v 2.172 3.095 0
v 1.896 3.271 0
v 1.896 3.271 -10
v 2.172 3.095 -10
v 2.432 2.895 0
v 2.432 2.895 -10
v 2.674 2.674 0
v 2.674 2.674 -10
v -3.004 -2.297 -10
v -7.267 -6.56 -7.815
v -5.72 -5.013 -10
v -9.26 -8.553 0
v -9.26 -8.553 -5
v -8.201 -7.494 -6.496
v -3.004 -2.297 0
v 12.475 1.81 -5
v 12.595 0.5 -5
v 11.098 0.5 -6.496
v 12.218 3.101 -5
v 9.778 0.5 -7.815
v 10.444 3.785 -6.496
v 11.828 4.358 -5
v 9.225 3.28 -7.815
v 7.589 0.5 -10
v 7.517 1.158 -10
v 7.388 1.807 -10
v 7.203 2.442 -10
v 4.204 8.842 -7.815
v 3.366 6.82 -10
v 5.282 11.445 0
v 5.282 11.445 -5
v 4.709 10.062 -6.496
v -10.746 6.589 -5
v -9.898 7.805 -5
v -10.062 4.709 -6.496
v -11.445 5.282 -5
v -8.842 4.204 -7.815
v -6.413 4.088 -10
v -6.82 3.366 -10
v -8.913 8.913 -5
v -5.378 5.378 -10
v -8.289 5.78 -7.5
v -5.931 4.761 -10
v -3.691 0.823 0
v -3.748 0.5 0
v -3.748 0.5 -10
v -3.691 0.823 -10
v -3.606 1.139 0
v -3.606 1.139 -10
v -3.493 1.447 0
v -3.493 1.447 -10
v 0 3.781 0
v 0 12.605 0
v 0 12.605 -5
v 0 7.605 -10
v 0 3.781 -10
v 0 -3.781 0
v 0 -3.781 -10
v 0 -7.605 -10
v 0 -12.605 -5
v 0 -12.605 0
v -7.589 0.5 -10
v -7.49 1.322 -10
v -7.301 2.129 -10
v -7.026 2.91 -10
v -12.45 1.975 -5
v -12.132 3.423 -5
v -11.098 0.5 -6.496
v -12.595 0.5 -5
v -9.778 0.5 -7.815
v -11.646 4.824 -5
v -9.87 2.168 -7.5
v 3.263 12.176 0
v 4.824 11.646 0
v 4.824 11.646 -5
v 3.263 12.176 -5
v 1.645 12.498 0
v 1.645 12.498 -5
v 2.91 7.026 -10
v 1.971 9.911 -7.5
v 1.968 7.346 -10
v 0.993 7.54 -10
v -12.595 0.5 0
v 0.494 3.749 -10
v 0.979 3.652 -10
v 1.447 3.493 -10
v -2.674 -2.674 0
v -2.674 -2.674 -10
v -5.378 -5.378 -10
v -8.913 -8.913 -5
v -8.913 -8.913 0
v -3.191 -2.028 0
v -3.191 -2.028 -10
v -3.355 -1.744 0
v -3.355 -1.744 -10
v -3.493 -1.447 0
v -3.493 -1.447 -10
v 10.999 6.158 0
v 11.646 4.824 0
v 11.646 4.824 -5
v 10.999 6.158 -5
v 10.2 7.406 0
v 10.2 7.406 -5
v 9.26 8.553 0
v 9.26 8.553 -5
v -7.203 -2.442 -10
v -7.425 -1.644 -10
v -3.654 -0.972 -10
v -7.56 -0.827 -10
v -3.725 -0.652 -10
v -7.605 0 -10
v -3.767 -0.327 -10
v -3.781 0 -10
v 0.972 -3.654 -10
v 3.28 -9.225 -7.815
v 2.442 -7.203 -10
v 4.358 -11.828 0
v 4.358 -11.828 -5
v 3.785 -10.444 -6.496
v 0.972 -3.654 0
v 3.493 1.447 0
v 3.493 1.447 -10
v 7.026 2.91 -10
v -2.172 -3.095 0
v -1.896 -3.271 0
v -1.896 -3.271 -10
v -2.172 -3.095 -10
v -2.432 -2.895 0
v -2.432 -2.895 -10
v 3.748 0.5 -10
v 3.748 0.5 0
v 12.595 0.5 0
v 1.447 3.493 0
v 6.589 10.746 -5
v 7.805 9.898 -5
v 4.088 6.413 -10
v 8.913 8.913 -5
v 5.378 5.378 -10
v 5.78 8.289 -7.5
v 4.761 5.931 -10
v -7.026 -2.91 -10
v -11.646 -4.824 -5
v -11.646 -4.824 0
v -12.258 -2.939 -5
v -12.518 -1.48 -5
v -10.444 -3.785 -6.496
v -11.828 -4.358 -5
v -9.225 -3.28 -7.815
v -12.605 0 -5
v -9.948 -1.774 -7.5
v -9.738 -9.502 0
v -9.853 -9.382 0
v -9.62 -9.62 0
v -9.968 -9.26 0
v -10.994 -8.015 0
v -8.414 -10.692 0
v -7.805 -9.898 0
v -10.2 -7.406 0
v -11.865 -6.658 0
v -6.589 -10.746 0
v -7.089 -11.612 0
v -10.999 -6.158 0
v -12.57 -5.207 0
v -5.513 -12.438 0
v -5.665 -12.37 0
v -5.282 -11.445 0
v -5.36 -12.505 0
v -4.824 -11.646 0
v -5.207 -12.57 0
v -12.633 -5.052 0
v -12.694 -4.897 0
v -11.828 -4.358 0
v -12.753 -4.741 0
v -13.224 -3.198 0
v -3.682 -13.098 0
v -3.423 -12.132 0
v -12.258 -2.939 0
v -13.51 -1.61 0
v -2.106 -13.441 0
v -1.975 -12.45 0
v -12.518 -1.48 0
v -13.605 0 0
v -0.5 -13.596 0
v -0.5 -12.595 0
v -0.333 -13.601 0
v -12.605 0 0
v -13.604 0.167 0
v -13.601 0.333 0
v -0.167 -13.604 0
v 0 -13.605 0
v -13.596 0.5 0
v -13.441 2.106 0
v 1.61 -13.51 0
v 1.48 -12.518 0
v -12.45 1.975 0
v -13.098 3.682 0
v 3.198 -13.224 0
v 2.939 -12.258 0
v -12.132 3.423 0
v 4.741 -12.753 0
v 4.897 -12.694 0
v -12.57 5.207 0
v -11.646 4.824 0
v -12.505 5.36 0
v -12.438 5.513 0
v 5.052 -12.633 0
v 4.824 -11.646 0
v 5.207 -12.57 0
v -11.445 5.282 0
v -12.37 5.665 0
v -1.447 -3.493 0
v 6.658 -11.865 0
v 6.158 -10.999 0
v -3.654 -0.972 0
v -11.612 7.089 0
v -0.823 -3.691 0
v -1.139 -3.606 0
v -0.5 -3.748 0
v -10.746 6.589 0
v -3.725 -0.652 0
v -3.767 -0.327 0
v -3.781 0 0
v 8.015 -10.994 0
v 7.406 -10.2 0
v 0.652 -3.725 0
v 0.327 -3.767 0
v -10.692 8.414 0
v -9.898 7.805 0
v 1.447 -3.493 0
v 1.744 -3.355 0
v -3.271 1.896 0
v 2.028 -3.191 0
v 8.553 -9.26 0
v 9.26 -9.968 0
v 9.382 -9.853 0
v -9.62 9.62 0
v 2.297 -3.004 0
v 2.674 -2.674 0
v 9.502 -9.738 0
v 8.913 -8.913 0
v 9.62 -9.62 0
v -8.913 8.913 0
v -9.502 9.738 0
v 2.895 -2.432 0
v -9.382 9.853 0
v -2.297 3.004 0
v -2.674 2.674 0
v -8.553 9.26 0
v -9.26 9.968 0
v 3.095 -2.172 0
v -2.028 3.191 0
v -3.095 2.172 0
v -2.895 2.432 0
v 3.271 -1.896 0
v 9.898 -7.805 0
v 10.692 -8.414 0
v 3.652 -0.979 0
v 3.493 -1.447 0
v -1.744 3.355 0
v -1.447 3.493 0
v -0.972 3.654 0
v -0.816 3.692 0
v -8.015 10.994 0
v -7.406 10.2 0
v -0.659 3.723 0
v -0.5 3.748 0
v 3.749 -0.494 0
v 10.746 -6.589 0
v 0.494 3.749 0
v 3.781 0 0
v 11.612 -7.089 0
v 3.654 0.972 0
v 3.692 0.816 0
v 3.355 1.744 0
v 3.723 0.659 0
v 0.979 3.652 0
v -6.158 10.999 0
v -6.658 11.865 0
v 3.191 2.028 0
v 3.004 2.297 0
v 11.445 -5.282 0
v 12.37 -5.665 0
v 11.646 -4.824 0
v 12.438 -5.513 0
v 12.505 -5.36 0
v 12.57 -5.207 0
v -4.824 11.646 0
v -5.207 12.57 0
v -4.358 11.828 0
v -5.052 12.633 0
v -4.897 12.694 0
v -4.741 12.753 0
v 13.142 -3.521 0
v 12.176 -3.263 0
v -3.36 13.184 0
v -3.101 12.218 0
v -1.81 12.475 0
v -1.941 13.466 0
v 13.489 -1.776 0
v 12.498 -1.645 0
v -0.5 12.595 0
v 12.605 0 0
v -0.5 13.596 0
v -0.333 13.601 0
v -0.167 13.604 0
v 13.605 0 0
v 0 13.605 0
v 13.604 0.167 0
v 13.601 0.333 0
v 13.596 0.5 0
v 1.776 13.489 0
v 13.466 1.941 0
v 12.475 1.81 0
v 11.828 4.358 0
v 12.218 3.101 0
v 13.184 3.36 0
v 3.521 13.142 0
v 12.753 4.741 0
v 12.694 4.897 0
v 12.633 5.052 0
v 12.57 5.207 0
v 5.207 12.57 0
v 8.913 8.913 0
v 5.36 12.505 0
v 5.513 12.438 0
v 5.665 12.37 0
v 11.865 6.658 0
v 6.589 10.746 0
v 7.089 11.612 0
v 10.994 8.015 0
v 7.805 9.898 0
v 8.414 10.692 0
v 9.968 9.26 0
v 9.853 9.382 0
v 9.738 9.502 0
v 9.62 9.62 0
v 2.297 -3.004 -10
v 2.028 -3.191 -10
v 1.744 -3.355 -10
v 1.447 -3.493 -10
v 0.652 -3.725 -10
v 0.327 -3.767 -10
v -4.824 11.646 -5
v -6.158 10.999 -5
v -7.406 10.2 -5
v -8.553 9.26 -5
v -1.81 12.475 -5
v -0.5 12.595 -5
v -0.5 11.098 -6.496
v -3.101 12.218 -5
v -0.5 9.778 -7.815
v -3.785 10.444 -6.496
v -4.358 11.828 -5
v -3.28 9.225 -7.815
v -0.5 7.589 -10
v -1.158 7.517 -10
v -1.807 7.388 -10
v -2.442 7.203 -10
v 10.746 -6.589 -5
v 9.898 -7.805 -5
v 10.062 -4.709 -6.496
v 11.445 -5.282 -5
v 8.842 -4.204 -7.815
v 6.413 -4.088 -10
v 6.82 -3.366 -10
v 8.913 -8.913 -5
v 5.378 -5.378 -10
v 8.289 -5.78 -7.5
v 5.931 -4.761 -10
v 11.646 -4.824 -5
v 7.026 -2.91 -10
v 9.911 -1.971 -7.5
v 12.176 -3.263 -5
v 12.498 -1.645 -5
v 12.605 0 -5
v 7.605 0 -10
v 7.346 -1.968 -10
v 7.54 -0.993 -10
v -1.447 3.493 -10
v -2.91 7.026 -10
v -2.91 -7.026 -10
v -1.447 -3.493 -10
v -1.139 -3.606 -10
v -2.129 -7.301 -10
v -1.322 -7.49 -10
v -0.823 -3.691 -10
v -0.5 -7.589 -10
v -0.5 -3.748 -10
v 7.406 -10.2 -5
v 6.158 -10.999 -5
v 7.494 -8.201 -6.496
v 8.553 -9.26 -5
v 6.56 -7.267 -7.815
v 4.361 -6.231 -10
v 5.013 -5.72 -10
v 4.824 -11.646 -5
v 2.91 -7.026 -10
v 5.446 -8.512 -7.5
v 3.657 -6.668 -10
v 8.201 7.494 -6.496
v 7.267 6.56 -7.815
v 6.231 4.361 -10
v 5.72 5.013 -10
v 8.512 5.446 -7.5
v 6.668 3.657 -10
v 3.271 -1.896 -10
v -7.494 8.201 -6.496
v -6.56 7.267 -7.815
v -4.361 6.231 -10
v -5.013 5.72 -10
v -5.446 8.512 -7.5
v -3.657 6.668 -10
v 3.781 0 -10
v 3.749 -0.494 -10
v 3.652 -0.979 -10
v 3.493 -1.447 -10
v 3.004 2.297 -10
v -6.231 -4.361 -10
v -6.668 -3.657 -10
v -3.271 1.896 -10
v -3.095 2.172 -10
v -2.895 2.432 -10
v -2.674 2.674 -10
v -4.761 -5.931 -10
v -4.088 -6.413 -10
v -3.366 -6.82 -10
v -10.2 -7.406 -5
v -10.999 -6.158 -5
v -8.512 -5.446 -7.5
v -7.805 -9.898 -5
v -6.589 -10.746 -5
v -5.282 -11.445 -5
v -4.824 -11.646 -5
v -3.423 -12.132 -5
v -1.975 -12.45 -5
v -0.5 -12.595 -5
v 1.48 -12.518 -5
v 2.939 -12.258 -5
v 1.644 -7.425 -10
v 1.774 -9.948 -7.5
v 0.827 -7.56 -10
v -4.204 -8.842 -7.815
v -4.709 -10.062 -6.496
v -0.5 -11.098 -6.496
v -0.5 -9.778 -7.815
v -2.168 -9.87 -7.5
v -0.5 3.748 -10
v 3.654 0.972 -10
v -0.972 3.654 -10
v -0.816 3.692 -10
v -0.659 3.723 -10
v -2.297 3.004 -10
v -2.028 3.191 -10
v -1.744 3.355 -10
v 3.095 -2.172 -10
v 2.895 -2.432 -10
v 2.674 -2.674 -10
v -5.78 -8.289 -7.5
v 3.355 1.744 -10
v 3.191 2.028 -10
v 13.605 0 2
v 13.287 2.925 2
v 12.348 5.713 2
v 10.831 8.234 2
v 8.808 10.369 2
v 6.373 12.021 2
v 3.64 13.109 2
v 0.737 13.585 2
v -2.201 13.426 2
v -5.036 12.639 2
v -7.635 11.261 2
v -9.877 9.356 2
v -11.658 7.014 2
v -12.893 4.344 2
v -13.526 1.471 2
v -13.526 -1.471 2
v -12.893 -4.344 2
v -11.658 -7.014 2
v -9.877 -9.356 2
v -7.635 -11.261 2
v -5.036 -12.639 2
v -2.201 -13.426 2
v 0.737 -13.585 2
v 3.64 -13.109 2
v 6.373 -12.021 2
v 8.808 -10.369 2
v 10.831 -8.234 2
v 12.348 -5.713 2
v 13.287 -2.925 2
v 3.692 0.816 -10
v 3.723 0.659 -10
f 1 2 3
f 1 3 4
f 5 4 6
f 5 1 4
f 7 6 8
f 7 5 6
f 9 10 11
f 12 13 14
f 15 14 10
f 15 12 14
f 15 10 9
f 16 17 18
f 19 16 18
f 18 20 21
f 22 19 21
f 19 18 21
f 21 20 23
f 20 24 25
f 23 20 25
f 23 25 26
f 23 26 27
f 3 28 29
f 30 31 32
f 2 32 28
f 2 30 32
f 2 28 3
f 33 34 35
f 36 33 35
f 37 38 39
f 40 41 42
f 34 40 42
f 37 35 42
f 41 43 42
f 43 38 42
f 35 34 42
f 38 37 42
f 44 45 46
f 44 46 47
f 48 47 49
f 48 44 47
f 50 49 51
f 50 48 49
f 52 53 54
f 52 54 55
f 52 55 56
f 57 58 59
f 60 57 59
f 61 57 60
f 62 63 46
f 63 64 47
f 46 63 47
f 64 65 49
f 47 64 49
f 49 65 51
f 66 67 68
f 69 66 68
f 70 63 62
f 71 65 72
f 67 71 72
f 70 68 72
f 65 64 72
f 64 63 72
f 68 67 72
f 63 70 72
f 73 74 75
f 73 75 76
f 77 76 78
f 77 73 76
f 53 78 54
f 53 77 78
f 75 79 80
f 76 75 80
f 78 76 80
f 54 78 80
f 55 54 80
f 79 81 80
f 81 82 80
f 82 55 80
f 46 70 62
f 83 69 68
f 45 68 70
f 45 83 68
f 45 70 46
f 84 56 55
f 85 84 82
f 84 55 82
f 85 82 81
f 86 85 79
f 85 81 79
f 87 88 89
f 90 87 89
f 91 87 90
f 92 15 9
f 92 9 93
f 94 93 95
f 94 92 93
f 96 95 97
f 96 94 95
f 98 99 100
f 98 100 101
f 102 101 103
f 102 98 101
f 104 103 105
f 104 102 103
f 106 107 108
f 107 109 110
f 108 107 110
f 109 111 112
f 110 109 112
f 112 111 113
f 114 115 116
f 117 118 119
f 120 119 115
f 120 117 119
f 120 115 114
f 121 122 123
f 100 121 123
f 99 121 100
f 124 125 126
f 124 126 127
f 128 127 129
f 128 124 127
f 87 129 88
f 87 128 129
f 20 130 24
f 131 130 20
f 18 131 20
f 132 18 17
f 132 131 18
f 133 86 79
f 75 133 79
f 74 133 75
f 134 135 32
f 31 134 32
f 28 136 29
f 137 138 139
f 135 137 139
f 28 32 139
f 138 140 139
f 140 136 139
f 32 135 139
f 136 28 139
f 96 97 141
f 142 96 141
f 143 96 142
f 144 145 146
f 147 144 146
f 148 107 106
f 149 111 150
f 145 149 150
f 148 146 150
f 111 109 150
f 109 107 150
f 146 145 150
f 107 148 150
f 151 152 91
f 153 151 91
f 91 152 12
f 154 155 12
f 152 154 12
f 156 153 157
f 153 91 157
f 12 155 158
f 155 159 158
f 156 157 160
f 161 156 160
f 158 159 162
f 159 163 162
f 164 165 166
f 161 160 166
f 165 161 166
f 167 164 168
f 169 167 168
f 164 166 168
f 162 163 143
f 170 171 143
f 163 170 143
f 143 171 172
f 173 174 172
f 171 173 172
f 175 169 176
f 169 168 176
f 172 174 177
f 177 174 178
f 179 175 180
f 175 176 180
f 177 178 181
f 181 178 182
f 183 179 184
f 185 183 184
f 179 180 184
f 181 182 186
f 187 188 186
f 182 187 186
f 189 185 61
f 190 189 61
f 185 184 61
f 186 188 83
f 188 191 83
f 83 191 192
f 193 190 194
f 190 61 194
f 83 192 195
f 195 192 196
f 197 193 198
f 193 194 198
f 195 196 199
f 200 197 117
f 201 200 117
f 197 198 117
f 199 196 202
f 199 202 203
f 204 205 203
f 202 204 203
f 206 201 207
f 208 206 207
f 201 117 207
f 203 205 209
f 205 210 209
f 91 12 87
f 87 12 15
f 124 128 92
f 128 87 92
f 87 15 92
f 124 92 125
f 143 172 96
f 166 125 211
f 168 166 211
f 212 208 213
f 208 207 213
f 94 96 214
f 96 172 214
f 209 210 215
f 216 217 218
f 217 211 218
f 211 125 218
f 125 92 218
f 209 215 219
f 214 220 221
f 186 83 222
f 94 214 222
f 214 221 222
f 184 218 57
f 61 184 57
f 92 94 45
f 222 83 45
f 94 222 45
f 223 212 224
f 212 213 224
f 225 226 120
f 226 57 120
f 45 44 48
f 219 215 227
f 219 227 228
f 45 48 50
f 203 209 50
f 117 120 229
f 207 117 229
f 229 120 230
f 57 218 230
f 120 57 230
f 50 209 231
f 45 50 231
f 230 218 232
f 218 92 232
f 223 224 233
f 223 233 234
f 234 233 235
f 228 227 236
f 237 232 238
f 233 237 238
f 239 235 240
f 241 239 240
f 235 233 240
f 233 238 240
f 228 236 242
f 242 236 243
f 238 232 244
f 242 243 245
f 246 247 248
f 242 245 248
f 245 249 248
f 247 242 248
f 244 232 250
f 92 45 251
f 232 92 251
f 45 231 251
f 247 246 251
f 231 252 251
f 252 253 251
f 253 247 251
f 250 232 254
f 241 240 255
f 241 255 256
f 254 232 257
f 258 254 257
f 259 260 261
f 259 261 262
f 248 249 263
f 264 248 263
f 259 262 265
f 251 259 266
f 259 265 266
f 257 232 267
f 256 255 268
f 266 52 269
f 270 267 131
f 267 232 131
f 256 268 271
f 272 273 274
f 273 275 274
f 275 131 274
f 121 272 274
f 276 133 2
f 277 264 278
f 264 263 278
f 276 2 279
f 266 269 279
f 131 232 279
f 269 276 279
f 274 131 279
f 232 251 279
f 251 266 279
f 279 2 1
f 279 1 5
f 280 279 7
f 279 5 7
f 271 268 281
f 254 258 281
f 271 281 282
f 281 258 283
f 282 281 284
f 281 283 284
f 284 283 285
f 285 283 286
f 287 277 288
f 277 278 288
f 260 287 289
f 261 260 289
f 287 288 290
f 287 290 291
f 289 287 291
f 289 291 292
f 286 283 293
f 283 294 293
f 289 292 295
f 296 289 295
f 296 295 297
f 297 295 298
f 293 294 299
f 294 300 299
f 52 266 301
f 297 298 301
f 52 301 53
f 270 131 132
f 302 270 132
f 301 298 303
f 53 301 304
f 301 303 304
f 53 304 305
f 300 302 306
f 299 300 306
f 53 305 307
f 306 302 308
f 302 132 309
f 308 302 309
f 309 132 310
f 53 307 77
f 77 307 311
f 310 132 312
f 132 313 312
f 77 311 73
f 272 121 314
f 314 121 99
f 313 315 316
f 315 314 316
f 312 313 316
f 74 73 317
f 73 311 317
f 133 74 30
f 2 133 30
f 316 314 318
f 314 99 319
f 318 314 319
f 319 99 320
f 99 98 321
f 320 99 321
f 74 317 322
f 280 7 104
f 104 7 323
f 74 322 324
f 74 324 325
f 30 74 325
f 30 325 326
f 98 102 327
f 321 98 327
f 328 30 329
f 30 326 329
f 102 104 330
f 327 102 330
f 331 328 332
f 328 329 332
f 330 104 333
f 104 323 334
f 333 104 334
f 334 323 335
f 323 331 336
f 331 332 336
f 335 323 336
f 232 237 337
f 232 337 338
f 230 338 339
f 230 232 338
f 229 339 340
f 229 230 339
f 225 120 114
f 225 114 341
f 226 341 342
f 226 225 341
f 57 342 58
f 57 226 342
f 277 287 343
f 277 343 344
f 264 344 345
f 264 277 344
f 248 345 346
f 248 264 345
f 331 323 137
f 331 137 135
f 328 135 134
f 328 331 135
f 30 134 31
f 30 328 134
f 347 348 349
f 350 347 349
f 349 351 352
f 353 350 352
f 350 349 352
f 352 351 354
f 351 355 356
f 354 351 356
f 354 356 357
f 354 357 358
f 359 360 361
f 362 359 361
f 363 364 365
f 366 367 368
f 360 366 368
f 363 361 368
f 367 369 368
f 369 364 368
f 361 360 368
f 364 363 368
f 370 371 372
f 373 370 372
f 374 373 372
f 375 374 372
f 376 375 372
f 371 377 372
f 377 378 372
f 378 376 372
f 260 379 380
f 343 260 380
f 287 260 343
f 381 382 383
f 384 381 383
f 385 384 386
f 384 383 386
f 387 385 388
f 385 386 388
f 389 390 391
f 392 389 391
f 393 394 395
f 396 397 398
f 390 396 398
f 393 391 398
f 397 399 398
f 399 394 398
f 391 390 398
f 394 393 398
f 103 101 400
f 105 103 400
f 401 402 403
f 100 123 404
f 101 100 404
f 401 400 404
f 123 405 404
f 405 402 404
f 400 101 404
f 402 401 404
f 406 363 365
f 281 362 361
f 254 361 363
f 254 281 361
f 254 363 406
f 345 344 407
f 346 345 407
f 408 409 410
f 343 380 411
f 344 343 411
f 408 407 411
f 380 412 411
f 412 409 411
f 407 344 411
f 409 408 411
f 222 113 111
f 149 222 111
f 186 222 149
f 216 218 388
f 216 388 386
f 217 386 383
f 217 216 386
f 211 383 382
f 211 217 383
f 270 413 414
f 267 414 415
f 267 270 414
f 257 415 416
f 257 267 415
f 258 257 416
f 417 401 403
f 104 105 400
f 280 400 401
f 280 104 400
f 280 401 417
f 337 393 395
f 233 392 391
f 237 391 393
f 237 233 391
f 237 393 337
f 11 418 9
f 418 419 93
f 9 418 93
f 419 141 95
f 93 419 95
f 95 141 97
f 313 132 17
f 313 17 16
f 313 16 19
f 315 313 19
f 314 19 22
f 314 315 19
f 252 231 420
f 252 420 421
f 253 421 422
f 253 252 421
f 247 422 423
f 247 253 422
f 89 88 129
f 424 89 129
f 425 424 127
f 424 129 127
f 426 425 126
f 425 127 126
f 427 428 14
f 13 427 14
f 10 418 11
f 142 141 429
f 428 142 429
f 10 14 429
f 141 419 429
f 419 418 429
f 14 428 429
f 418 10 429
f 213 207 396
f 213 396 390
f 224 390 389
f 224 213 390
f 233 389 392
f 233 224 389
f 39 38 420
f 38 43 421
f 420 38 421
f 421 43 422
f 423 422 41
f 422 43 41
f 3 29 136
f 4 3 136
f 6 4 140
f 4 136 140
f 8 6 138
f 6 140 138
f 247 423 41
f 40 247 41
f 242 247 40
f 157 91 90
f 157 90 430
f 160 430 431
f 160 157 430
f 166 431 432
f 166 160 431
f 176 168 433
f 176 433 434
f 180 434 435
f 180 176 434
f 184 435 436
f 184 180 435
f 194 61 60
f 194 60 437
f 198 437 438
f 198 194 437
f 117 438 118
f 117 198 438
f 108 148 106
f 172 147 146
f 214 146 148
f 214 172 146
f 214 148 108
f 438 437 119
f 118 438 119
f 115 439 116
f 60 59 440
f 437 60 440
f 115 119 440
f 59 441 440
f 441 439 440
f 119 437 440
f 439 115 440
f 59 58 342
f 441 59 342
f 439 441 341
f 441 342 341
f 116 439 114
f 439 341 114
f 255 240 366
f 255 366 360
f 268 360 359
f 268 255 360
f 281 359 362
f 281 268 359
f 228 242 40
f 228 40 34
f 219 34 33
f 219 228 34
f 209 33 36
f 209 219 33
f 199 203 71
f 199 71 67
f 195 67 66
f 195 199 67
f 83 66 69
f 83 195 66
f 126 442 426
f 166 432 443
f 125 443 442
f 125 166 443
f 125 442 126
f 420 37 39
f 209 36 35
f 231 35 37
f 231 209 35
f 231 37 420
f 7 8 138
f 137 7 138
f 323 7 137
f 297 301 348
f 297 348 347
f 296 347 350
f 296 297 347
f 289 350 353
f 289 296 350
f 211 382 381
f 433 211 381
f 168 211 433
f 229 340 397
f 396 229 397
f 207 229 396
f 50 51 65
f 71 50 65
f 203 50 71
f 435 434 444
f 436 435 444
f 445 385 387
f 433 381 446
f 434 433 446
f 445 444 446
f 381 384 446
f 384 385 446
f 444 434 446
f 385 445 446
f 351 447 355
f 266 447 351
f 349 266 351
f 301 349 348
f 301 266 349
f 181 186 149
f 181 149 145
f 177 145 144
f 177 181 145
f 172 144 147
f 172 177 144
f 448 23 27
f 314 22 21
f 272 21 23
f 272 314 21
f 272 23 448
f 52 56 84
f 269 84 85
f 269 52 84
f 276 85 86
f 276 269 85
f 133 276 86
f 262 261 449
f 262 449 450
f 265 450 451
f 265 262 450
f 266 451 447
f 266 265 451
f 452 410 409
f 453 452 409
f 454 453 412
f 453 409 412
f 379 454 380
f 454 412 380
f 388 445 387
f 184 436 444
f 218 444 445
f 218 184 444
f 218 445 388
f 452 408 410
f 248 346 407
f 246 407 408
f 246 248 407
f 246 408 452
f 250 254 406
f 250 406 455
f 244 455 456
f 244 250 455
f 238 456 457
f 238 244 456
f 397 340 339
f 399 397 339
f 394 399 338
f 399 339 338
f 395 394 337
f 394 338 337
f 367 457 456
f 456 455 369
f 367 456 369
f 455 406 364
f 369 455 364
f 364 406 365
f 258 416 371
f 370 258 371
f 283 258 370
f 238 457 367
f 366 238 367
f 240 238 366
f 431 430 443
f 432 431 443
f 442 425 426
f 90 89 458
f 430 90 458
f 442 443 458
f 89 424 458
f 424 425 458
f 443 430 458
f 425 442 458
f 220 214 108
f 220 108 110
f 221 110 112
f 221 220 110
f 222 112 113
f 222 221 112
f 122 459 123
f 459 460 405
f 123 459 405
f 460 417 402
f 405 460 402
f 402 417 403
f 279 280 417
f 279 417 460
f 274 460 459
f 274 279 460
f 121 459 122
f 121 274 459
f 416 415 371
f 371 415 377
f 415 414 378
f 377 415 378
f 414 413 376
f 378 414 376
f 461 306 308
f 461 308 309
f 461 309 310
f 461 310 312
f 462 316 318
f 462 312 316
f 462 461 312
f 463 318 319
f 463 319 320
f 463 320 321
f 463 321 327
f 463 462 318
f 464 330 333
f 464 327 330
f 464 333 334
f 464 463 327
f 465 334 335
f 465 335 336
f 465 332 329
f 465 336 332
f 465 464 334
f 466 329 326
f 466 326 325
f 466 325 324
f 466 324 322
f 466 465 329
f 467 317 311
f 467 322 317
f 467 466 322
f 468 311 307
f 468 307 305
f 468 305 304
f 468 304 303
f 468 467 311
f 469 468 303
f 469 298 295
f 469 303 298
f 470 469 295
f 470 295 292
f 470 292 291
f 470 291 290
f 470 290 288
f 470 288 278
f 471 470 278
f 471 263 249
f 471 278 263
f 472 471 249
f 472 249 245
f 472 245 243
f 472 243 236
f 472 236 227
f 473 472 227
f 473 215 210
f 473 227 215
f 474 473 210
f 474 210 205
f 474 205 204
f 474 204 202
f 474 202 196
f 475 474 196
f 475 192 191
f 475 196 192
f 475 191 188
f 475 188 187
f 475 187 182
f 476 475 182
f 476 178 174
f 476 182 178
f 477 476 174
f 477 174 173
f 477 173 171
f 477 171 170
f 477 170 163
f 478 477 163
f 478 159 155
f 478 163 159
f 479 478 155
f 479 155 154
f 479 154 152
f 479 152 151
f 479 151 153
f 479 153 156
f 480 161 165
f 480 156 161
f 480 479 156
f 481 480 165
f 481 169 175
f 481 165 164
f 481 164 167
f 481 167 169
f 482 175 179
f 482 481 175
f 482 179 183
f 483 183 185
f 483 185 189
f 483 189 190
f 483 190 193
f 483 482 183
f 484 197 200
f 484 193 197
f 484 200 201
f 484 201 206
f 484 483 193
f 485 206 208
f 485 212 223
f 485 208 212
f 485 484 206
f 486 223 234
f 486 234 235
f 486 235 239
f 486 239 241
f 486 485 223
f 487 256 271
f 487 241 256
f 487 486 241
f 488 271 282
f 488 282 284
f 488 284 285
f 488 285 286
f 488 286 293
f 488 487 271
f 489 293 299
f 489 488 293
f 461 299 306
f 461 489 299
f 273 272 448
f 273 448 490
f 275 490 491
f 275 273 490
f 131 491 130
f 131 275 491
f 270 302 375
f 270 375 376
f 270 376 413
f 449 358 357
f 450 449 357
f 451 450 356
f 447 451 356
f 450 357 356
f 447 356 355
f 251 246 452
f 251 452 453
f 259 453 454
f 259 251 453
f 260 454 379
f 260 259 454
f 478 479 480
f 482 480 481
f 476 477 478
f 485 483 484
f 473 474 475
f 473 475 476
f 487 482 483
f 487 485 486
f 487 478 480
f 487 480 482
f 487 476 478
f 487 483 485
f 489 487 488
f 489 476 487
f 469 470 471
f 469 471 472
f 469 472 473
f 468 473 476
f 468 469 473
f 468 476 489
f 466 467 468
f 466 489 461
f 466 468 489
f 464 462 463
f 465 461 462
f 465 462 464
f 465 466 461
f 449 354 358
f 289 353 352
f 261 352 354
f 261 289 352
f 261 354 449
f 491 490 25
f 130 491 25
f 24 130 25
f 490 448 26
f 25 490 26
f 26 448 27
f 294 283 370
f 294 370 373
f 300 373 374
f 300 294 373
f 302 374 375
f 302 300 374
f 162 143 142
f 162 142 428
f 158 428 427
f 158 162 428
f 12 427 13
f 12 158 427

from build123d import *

# Parameters (mm, degrees)
SKETCH1_R            = 40
SKETCH1_R_2          = 37
BOSS_EXTRUDE10_DEPTH = 2
BOSS_EXTRUDE12_START = -2
SKETCH4_R            = 37
BOSS_EXTRUDE12_DEPTH = 2
BOSS_EXTRUDE14_DEPTH = 20
BOSS_EXTRUDE15_DEPTH = 15
BOSS_EXTRUDE16_DEPTH = 10
CHAMFER6_SIZE        = 5
CHAMFER7_SIZE        = 5
CHAMFER8_SIZE        = 5
CHAMFER9_SIZE        = 1
SKETCH5_R            = 42.605372115
SKETCH5_R_2          = 13.605372115
CUT_EXTRUDE1_DEPTH   = 31


with BuildPart() as part:
    # Sketch1 → Boss-Extrude10 (new body)
    with BuildSketch(Plane.XY):
        Circle(SKETCH1_R)
        Circle(SKETCH1_R_2, mode=Mode.SUBTRACT)
    extrude(amount=BOSS_EXTRUDE10_DEPTH)

    # Sketch4 → Boss-Extrude12 (add)
    with BuildSketch(Plane.XY.offset(2).offset(BOSS_EXTRUDE12_START)):
        Circle(SKETCH4_R)
    extrude(amount=BOSS_EXTRUDE12_DEPTH)

    # Sketch1_20 → Boss-Extrude14 (add)
    with BuildSketch(Plane.XY):
        with BuildLine():
            Line((-0.5, 29.032669707), (-0.5, 36.996621467))
            ThreePointArc((-0.5, 36.996621467), (-7.218341915, 36.289055375), (-13.696054323, 34.371763062))
            Line((-13.696054323, 34.371763062), (-10.648381928, 27.014031033))
            ThreePointArc((-10.648381928, 27.014031033), (-5.66483278, 28.479037552), (-0.5, 29.032669707))
        make_face()
        with BuildLine():
            Line((-11.111969214, 26.82666678), (-14.159286998, 34.183542703))
            ThreePointArc((-14.159286998, 34.183542703), (-20.347757215, 30.902569089), (-25.80700853, 26.514115311))
            Line((-25.80700853, 26.514115311), (-20.175644235, 20.882751017))
            ThreePointArc((-20.175644235, 20.882751017), (-15.923605825, 24.281365033), (-11.111969214, 26.82666678))
        make_face()
        with BuildLine():
            Line((-20.532241845, 20.532241845), (-26.162950904, 26.162950904))
            ThreePointArc((-26.162950904, 26.162950904), (-30.624777631, 20.763501512), (-33.98907963, 14.619933855))
            Line((-33.98907963, 14.619933855), (-26.631347601, 11.572261461))
            ThreePointArc((-26.631347601, 11.572261461), (-24.003569619, 16.339356042), (-20.532241845, 20.532241845))
        make_face()
        with BuildLine():
            Line((-26.82666678, 11.111969214), (-34.183542703, 14.159286998))
            ThreePointArc((-34.183542703, 14.159286998), (-36.239453268, 7.463379051), (-36.996621467, 0.5))
            Line((-36.996621467, 0.5), (-29.032669707, 0.5))
            ThreePointArc((-29.032669707, 0.5), (-28.429207531, 5.909828211), (-26.82666678, 11.111969214))
        make_face()
        with BuildLine():
            Line((-29.036974883, 0), (-37, 0))
            ThreePointArc((-37, 0), (-36.337000656, -6.972975215), (-34.371763062, -13.696054323))
            Line((-34.371763062, -13.696054323), (-27.014031033, -10.648381928))
            ThreePointArc((-27.014031033, -10.648381928), (-28.526756308, -5.419417393), (-29.036974883, 0))
        make_face()
        with BuildLine():
            Line((-26.82666678, -11.111969214), (-34.183542703, -14.159286998))
            ThreePointArc((-34.183542703, -14.159286998), (-30.902569089, -20.347757215), (-26.514115311, -25.80700853))
            Line((-26.514115311, -25.80700853), (-20.882751017, -20.175644235))
            ThreePointArc((-20.882751017, -20.175644235), (-24.281365033, -15.923605825), (-26.82666678, -11.111969214))
        make_face()
        with BuildLine():
            Line((-20.532241845, -20.532241845), (-26.162950904, -26.162950904))
            ThreePointArc((-26.162950904, -26.162950904), (-20.763501512, -30.624777631), (-14.619933855, -33.98907963))
            Line((-14.619933855, -33.98907963), (-11.572261461, -26.631347601))
            ThreePointArc((-11.572261461, -26.631347601), (-16.339356042, -24.003569619), (-20.532241845, -20.532241845))
        make_face()
        with BuildLine():
            Line((-11.111969214, -26.82666678), (-14.159286998, -34.183542703))
            ThreePointArc((-14.159286998, -34.183542703), (-7.463379051, -36.239453268), (-0.5, -36.996621467))
            Line((-0.5, -36.996621467), (-0.5, -29.032669707))
            ThreePointArc((-0.5, -29.032669707), (-5.909828211, -28.429207531), (-11.111969214, -26.82666678))
        make_face()
        with BuildLine():
            ThreePointArc((0, -37), (6.972975215, -36.337000656), (13.696054323, -34.371763062))
            Line((13.696054323, -34.371763062), (10.648381928, -27.014031033))
            ThreePointArc((10.648381928, -27.014031033), (5.419417393, -28.526756308), (0, -29.036974883))
            Line((0, -29.036974883), (0, -37))
        make_face()
        with BuildLine():
            ThreePointArc((14.159286998, -34.183542703), (20.347757215, -30.902569089), (25.80700853, -26.514115311))
            Line((25.80700853, -26.514115311), (20.175644235, -20.882751017))
            ThreePointArc((20.175644235, -20.882751017), (15.923605825, -24.281365033), (11.111969214, -26.82666678))
            Line((11.111969214, -26.82666678), (14.159286998, -34.183542703))
        make_face()
        with BuildLine():
            ThreePointArc((26.162950904, -26.162950904), (30.624777631, -20.763501512), (33.98907963, -14.619933855))
            Line((33.98907963, -14.619933855), (26.631347601, -11.572261461))
            ThreePointArc((26.631347601, -11.572261461), (24.003569619, -16.339356042), (20.532241845, -20.532241845))
            Line((20.532241845, -20.532241845), (26.162950904, -26.162950904))
        make_face()
        with BuildLine():
            ThreePointArc((34.183542703, -14.159286998), (36.289055375, -7.218341915), (37, 0))
            Line((37, 0), (29.036974883, 0))
            ThreePointArc((29.036974883, 0), (28.479037552, -5.66483278), (26.82666678, -11.111969214))
            Line((26.82666678, -11.111969214), (34.183542703, -14.159286998))
        make_face()
        with BuildLine():
            ThreePointArc((36.996621467, 0.5), (36.289055375, 7.218341915), (34.371763062, 13.696054323))
            Line((34.371763062, 13.696054323), (27.014031033, 10.648381928))
            ThreePointArc((27.014031033, 10.648381928), (28.479037552, 5.66483278), (29.032669707, 0.5))
            Line((29.032669707, 0.5), (36.996621467, 0.5))
        make_face()
        with BuildLine():
            ThreePointArc((34.183542703, 14.159286998), (30.902569089, 20.347757215), (26.514115311, 25.80700853))
            Line((26.514115311, 25.80700853), (20.882751017, 20.175644235))
            ThreePointArc((20.882751017, 20.175644235), (24.281365033, 15.923605825), (26.82666678, 11.111969214))
            Line((26.82666678, 11.111969214), (34.183542703, 14.159286998))
        make_face()
        with BuildLine():
            ThreePointArc((26.162950904, 26.162950904), (20.763501512, 30.624777631), (14.619933855, 33.98907963))
            Line((14.619933855, 33.98907963), (11.572261461, 26.631347601))
            ThreePointArc((11.572261461, 26.631347601), (16.339356042, 24.003569619), (20.532241845, 20.532241845))
            Line((20.532241845, 20.532241845), (26.162950904, 26.162950904))
        make_face()
        with BuildLine():
            ThreePointArc((14.159286998, 34.183542703), (7.218341915, 36.289055375), (0, 37))
            Line((0, 37), (0, 29.036974883))
            ThreePointArc((0, 29.036974883), (5.66483278, 28.479037552), (11.111969214, 26.82666678))
            Line((11.111969214, 26.82666678), (14.159286998, 34.183542703))
        make_face()
    extrude(amount=-BOSS_EXTRUDE14_DEPTH)

    # Sketch1_21 → Boss-Extrude15 (add)
    with BuildSketch(Plane.XY):
        with BuildLine():
            ThreePointArc((18.410921501, -18.410921501), (21.509056391, -14.672578308), (23.859250637, -10.424021302))
            Line((23.859250637, -10.424021302), (12.369892059, -5.664973156))
            ThreePointArc((12.369892059, -5.664973156), (11.17162686, -7.765365652), (9.620450883, -9.620450883))
            Line((9.620450883, -9.620450883), (18.410921501, -18.410921501))
        make_face()
        with BuildLine():
            ThreePointArc((9.963918917, -24.055028183), (14.256824335, -21.786854315), (18.053973073, -18.761079855))
            Line((18.053973073, -18.761079855), (9.260398721, -9.967505502))
            ThreePointArc((9.260398721, -9.967505502), (7.349560619, -11.4494589), (5.2065505, -12.56972483))
            Line((5.2065505, -12.56972483), (9.963918917, -24.055028183))
        make_face()
        with BuildLine():
            ThreePointArc((4.741093623, -12.752575491), (2.408590398, -13.39047582), (0, -13.605372115))
            Line((0, -13.605372115), (0, -26.036974883))
            ThreePointArc((0, -26.036974883), (4.834120012, -25.58427925), (9.500141769, -24.241934069))
            Line((9.500141769, -24.241934069), (4.741093623, -12.752575491))
        make_face()
        with BuildLine():
            Line((-0.5, -26.032173575), (-0.5, -13.596181464))
            ThreePointArc((-0.5, -13.596181464), (-2.899065877, -13.292914182), (-5.2065505, -12.56972483))
            Line((-5.2065505, -12.56972483), (-9.963918917, -24.055028183))
            ThreePointArc((-9.963918917, -24.055028183), (-5.324535261, -25.486729592), (-0.5, -26.032173575))
        make_face()
        with BuildLine():
            Line((-9.620450883, -9.620450883), (-18.410921501, -18.410921501))
            ThreePointArc((-18.410921501, -18.410921501), (-14.672578308, -21.509056391), (-10.424021302, -23.859250637))
            Line((-10.424021302, -23.859250637), (-5.664973156, -12.369892059))
            ThreePointArc((-5.664973156, -12.369892059), (-7.765365652, -11.17162686), (-9.620450883, -9.620450883))
        make_face()
        with BuildLine():
            Line((-12.56972483, -5.2065505), (-24.055028183, -9.963918917))
            ThreePointArc((-24.055028183, -9.963918917), (-21.786854315, -14.256824335), (-18.761079855, -18.053973073))
            Line((-18.761079855, -18.053973073), (-9.967505502, -9.260398721))
            ThreePointArc((-9.967505502, -9.260398721), (-11.4494589, -7.349560619), (-12.56972483, -5.2065505))
        make_face()
        with BuildLine():
            Line((-13.605372115, 0), (-26.036974883, 0))
            ThreePointArc((-26.036974883, 0), (-25.58427925, -4.834120012), (-24.241934069, -9.500141769))
            Line((-24.241934069, -9.500141769), (-12.752575491, -4.741093623))
            ThreePointArc((-12.752575491, -4.741093623), (-13.39047582, -2.408590398), (-13.605372115, 0))
        make_face()
        with BuildLine():
            Line((-12.56972483, 5.2065505), (-24.055028183, 9.963918917))
            ThreePointArc((-24.055028183, 9.963918917), (-25.486729592, 5.324535261), (-26.032173575, 0.5))
            Line((-26.032173575, 0.5), (-13.596181464, 0.5))
            ThreePointArc((-13.596181464, 0.5), (-13.292914182, 2.899065877), (-12.56972483, 5.2065505))
        make_face()
        with BuildLine():
            Line((-9.620450883, 9.620450883), (-18.410921501, 18.410921501))
            ThreePointArc((-18.410921501, 18.410921501), (-21.509056391, 14.672578308), (-23.859250637, 10.424021302))
            Line((-23.859250637, 10.424021302), (-12.369892059, 5.664973156))
            ThreePointArc((-12.369892059, 5.664973156), (-11.17162686, 7.765365652), (-9.620450883, 9.620450883))
        make_face()
        with BuildLine():
            Line((-5.2065505, 12.56972483), (-9.963918917, 24.055028183))
            ThreePointArc((-9.963918917, 24.055028183), (-14.256824335, 21.786854315), (-18.053973073, 18.761079855))
            Line((-18.053973073, 18.761079855), (-9.260398721, 9.967505502))
            ThreePointArc((-9.260398721, 9.967505502), (-7.349560619, 11.4494589), (-5.2065505, 12.56972483))
        make_face()
        with BuildLine():
            Line((-0.5, 13.596181464), (-0.5, 26.032173575))
            ThreePointArc((-0.5, 26.032173575), (-5.079561814, 25.536681711), (-9.500141769, 24.241934069))
            Line((-9.500141769, 24.241934069), (-4.741093623, 12.752575491))
            ThreePointArc((-4.741093623, 12.752575491), (-2.654276427, 13.343948705), (-0.5, 13.596181464))
        make_face()
        with BuildLine():
            ThreePointArc((9.963918917, 24.055028183), (5.079561814, 25.536681711), (0, 26.036974883))
            Line((0, 26.036974883), (0, 13.605372115))
            ThreePointArc((0, 13.605372115), (2.654276427, 13.343948705), (5.2065505, 12.56972483))
            Line((5.2065505, 12.56972483), (9.963918917, 24.055028183))
        make_face()
        with BuildLine():
            ThreePointArc((18.410921501, 18.410921501), (14.672578308, 21.509056391), (10.424021302, 23.859250637))
            Line((10.424021302, 23.859250637), (5.664973156, 12.369892059))
            ThreePointArc((5.664973156, 12.369892059), (7.765365652, 11.17162686), (9.620450883, 9.620450883))
            Line((9.620450883, 9.620450883), (18.410921501, 18.410921501))
        make_face()
        with BuildLine():
            ThreePointArc((24.055028183, 9.963918917), (21.786854315, 14.256824335), (18.761079855, 18.053973073))
            Line((18.761079855, 18.053973073), (9.967505502, 9.260398721))
            ThreePointArc((9.967505502, 9.260398721), (11.4494589, 7.349560619), (12.56972483, 5.2065505))
            Line((12.56972483, 5.2065505), (24.055028183, 9.963918917))
        make_face()
        with BuildLine():
            ThreePointArc((26.032173575, 0.5), (25.536681711, 5.079561814), (24.241934069, 9.500141769))
            Line((24.241934069, 9.500141769), (12.752575491, 4.741093623))
            ThreePointArc((12.752575491, 4.741093623), (13.343948705, 2.654276427), (13.596181464, 0.5))
            Line((13.596181464, 0.5), (26.032173575, 0.5))
        make_face()
        with BuildLine():
            ThreePointArc((24.055028183, -9.963918917), (25.536681711, -5.079561814), (26.036974883, 0))
            Line((26.036974883, 0), (13.605372115, 0))
            ThreePointArc((13.605372115, 0), (13.343948705, -2.654276427), (12.56972483, -5.2065505))
            Line((12.56972483, -5.2065505), (24.055028183, -9.963918917))
        make_face()
    extrude(amount=-BOSS_EXTRUDE15_DEPTH)

    # Sketch1_22 → Boss-Extrude16 (add)
    with BuildSketch(Plane.XY):
        with BuildLine():
            ThreePointArc((3.271407603, -1.896257497), (2.997891812, -2.304461951), (2.673752064, -2.673752064))
            Line((2.673752064, -2.673752064), (8.913344102, -8.913344102))
            ThreePointArc((8.913344102, -8.913344102), (10.340001661, -7.209699843), (11.445338409, -5.282010495))
            Line((11.445338409, -5.282010495), (3.271407603, -1.896257497))
        make_face()
        with BuildLine():
            ThreePointArc((2.296720199, -3.00382698), (1.887811476, -3.276288758), (1.44702419, -3.493425424))
            Line((1.44702419, -3.493425424), (4.823867067, -11.645845297))
            ThreePointArc((4.823867067, -11.645845297), (6.793883218, -10.617841447), (8.552775993, -9.259882774))
            Line((8.552775993, -9.259882774), (2.296720199, -3.00382698))
        make_face()
        with BuildLine():
            ThreePointArc((0.972377965, -3.654091035), (0.490328957, -3.749330302), (0, -3.781256431))
            Line((0, -3.781256431), (0, -12.605372115))
            ThreePointArc((0, -12.605372115), (2.213457642, -12.409512941), (4.358130963, -11.828021841))
            Line((4.358130963, -11.828021841), (0.972377965, -3.654091035))
        make_face()
        with BuildLine():
            Line((-0.5, -12.595451805), (-0.5, -3.748052854))
            ThreePointArc((-0.5, -3.748052854), (-0.981801701, -3.651570295), (-1.44702419, -3.493425424))
            Line((-1.44702419, -3.493425424), (-4.823867067, -11.645845297))
            ThreePointArc((-4.823867067, -11.645845297), (-2.703946795, -12.311948583), (-0.5, -12.595451805))
        make_face()
        with BuildLine():
            ThreePointArc((-1.896257497, -3.271407603), (-2.304461951, -2.997891812), (-2.673752064, -2.673752064))
            Line((-2.673752064, -2.673752064), (-8.913344102, -8.913344102))
            ThreePointArc((-8.913344102, -8.913344102), (-7.209699843, -10.340001661), (-5.282010495, -11.445338409))
            Line((-5.282010495, -11.445338409), (-1.896257497, -3.271407603))
        make_face()
        with BuildLine():
            ThreePointArc((-3.00382698, -2.296720199), (-3.276288758, -1.887811476), (-3.493425424, -1.44702419))
            Line((-3.493425424, -1.44702419), (-11.645845297, -4.823867067))
            ThreePointArc((-11.645845297, -4.823867067), (-10.617841447, -6.793883218), (-9.259882774, -8.552775993))
            Line((-9.259882774, -8.552775993), (-3.00382698, -2.296720199))
        make_face()
        with BuildLine():
            ThreePointArc((-3.654091035, -0.972377965), (-3.749330302, -0.490328957), (-3.781256431, 0))
            Line((-3.781256431, 0), (-12.605372115, 0))
            ThreePointArc((-12.605372115, 0), (-12.409512941, -2.213457642), (-11.828021841, -4.358130963))
            Line((-11.828021841, -4.358130963), (-3.654091035, -0.972377965))
        make_face()
        with BuildLine():
            Line((-3.493425424, 1.44702419), (-11.645845297, 4.823867067))
            ThreePointArc((-11.645845297, 4.823867067), (-12.311948583, 2.703946795), (-12.595451805, 0.5))
            Line((-12.595451805, 0.5), (-3.748052854, 0.5))
            ThreePointArc((-3.748052854, 0.5), (-3.651570295, 0.981801701), (-3.493425424, 1.44702419))
        make_face()
        with BuildLine():
            Line((-2.673752064, 2.673752064), (-8.913344102, 8.913344102))
            ThreePointArc((-8.913344102, 8.913344102), (-10.340001661, 7.209699843), (-11.445338409, 5.282010495))
            Line((-11.445338409, 5.282010495), (-3.271407603, 1.896257497))
            ThreePointArc((-3.271407603, 1.896257497), (-2.997891812, 2.304461951), (-2.673752064, 2.673752064))
        make_face()
        with BuildLine():
            Line((-1.44702419, 3.493425424), (-4.823867067, 11.645845297))
            ThreePointArc((-4.823867067, 11.645845297), (-6.793883218, 10.617841447), (-8.552775993, 9.259882774))
            Line((-8.552775993, 9.259882774), (-2.296720199, 3.00382698))
            ThreePointArc((-2.296720199, 3.00382698), (-1.887811476, 3.276288758), (-1.44702419, 3.493425424))
        make_face()
        with BuildLine():
            Line((-0.5, 3.748052854), (-0.5, 12.595451805))
            ThreePointArc((-0.5, 12.595451805), (-2.459186105, 12.363163425), (-4.358130963, 11.828021841))
            Line((-4.358130963, 11.828021841), (-0.972377965, 3.654091035))
            ThreePointArc((-0.972377965, 3.654091035), (-0.737686535, 3.708600649), (-0.5, 3.748052854))
        make_face()
        with BuildLine():
            ThreePointArc((4.823867067, 11.645845297), (2.459186105, 12.363163425), (0, 12.605372115))
            Line((0, 12.605372115), (0, 3.781256431))
            ThreePointArc((0, 3.781256431), (0.737686535, 3.708600649), (1.44702419, 3.493425424))
            Line((1.44702419, 3.493425424), (4.823867067, 11.645845297))
        make_face()
        with BuildLine():
            ThreePointArc((8.913344102, 8.913344102), (7.209699843, 10.340001661), (5.282010495, 11.445338409))
            Line((5.282010495, 11.445338409), (1.896257497, 3.271407603))
            ThreePointArc((1.896257497, 3.271407603), (2.304461951, 2.997891812), (2.673752064, 2.673752064))
            Line((2.673752064, 2.673752064), (8.913344102, 8.913344102))
        make_face()
        with BuildLine():
            ThreePointArc((11.645845297, 4.823867067), (10.617841447, 6.793883218), (9.259882774, 8.552775993))
            Line((9.259882774, 8.552775993), (3.00382698, 2.296720199))
            ThreePointArc((3.00382698, 2.296720199), (3.276288758, 1.887811476), (3.493425424, 1.44702419))
            Line((3.493425424, 1.44702419), (11.645845297, 4.823867067))
        make_face()
        with BuildLine():
            ThreePointArc((12.595451805, 0.5), (12.363163425, 2.459186105), (11.828021841, 4.358130963))
            Line((11.828021841, 4.358130963), (3.654091035, 0.972377965))
            ThreePointArc((3.654091035, 0.972377965), (3.708600649, 0.737686535), (3.748052854, 0.5))
            Line((3.748052854, 0.5), (12.595451805, 0.5))
        make_face()
        with BuildLine():
            ThreePointArc((11.645845297, -4.823867067), (12.363163425, -2.459186105), (12.605372115, 0))
            Line((12.605372115, 0), (3.781256431, 0))
            ThreePointArc((3.781256431, 0), (3.708600649, -0.737686535), (3.493425424, -1.44702419))
            Line((3.493425424, -1.44702419), (11.645845297, -4.823867067))
        make_face()
    extrude(amount=-BOSS_EXTRUDE16_DEPTH)

    # Chamfer6
    chamfer6_edges = [part.edges().sort_by_distance(p)[0] for p in [
        (6.972975215, -36.337000656, -20),
        (20.347757215, -30.902569089, -20),
        (30.624777631, -20.763501512, -20),
        (36.289055375, -7.218341915, -20),
        (36.289055375, 7.218341915, -20),
        (30.902569089, 20.347757215, -20),
        (-7.218341915, 36.289055375, -20),
        (20.763501512, 30.624777631, -20),
        (7.218341915, 36.289055375, -20),
        (-20.347757215, 30.902569089, -20),
        (-30.624777631, 20.763501512, -20),
        (-36.239453268, 7.463379051, -20),
        (-36.337000656, -6.972975215, -20),
        (-30.902569089, -20.347757215, -20),
        (-20.763501512, -30.624777631, -20),
        (-7.463379051, -36.239453268, -20),
    ]]
    chamfer(chamfer6_edges, length=CHAMFER6_SIZE)

    # Chamfer7
    chamfer7_edges = [part.edges().sort_by_distance(p)[0] for p in [
        (21.509056391, -14.672578308, -15),
        (11.17162686, -7.765365652, -15),
        (14.256824335, -21.786854315, -15),
        (7.349560619, -11.4494589, -15),
        (4.834120012, -25.58427925, -15),
        (2.408590398, -13.39047582, -15),
        (-5.324535261, -25.486729592, -15),
        (-2.899065877, -13.292914182, -15),
        (-14.672578308, -21.509056391, -15),
        (-7.765365652, -11.17162686, -15),
        (-21.786854315, -14.256824335, -15),
        (-11.4494589, -7.349560619, -15),
        (-25.58427925, -4.834120012, -15),
        (-13.39047582, -2.408590398, -15),
        (-25.486729592, 5.324535261, -15),
        (-13.292914182, 2.899065877, -15),
        (-21.509056391, 14.672578308, -15),
        (-11.17162686, 7.765365652, -15),
        (-14.256824335, 21.786854315, -15),
        (-7.349560619, 11.4494589, -15),
        (-5.079561814, 25.536681711, -15),
        (-2.654276427, 13.343948705, -15),
        (5.079561814, 25.536681711, -15),
        (2.654276427, 13.343948705, -15),
        (14.672578308, 21.509056391, -15),
        (7.765365652, 11.17162686, -15),
        (21.786854315, 14.256824335, -15),
        (11.4494589, 7.349560619, -15),
        (25.536681711, 5.079561814, -15),
        (13.343948705, 2.654276427, -15),
        (25.536681711, -5.079561814, -15),
        (13.343948705, -2.654276427, -15),
    ]]
    chamfer(chamfer7_edges, length=CHAMFER7_SIZE)

    # Chamfer8
    chamfer8_edges = [part.edges().sort_by_distance(p)[0] for p in [
        (10.340001661, -7.209699843, -10),
        (6.793883218, -10.617841447, -10),
        (2.213457642, -12.409512941, -10),
        (-2.703946795, -12.311948583, -10),
        (-7.209699843, -10.340001661, -10),
        (-10.617841447, -6.793883218, -10),
        (-12.409512941, -2.213457642, -10),
        (-12.311948583, 2.703946795, -10),
        (-10.340001661, 7.209699843, -10),
        (-6.793883218, 10.617841447, -10),
        (-2.459186105, 12.363163425, -10),
        (2.459186105, 12.363163425, -10),
        (7.209699843, 10.340001661, -10),
        (10.617841447, 6.793883218, -10),
        (12.363163425, 2.459186105, -10),
        (12.363163425, -2.459186105, -10),
    ]]
    chamfer(chamfer8_edges, length=CHAMFER8_SIZE)

    # Chamfer9
    chamfer9_edges = [part.edges().sort_by_distance(p)[0] for p in [
        (5.419417393, -28.526756308, -20),
        (15.923605825, -24.281365033, -20),
        (24.003569619, -16.339356042, -20),
        (28.479037552, -5.66483278, -20),
        (28.479037552, 5.66483278, -20),
        (24.281365033, 15.923605825, -20),
        (16.339356042, 24.003569619, -20),
        (-5.66483278, 28.479037552, -20),
        (5.66483278, 28.479037552, -20),
        (-15.923605825, 24.281365033, -20),
        (-24.003569619, 16.339356042, -20),
        (-28.429207531, 5.909828211, -20),
        (-28.526756308, -5.419417393, -20),
        (-24.281365033, -15.923605825, -20),
        (-16.339356042, -24.003569619, -20),
        (-5.909828211, -28.429207531, -20),
    ]]
    chamfer(chamfer9_edges, length=CHAMFER9_SIZE)

    # Sketch5 → Cut-Extrude1 (cut)
    with BuildSketch(Plane.XY.offset(2)):
        Circle(SKETCH5_R)
        Circle(SKETCH5_R_2, mode=Mode.SUBTRACT)
    extrude(amount=-CUT_EXTRUDE1_DEPTH, mode=Mode.SUBTRACT)


solid = part.part
